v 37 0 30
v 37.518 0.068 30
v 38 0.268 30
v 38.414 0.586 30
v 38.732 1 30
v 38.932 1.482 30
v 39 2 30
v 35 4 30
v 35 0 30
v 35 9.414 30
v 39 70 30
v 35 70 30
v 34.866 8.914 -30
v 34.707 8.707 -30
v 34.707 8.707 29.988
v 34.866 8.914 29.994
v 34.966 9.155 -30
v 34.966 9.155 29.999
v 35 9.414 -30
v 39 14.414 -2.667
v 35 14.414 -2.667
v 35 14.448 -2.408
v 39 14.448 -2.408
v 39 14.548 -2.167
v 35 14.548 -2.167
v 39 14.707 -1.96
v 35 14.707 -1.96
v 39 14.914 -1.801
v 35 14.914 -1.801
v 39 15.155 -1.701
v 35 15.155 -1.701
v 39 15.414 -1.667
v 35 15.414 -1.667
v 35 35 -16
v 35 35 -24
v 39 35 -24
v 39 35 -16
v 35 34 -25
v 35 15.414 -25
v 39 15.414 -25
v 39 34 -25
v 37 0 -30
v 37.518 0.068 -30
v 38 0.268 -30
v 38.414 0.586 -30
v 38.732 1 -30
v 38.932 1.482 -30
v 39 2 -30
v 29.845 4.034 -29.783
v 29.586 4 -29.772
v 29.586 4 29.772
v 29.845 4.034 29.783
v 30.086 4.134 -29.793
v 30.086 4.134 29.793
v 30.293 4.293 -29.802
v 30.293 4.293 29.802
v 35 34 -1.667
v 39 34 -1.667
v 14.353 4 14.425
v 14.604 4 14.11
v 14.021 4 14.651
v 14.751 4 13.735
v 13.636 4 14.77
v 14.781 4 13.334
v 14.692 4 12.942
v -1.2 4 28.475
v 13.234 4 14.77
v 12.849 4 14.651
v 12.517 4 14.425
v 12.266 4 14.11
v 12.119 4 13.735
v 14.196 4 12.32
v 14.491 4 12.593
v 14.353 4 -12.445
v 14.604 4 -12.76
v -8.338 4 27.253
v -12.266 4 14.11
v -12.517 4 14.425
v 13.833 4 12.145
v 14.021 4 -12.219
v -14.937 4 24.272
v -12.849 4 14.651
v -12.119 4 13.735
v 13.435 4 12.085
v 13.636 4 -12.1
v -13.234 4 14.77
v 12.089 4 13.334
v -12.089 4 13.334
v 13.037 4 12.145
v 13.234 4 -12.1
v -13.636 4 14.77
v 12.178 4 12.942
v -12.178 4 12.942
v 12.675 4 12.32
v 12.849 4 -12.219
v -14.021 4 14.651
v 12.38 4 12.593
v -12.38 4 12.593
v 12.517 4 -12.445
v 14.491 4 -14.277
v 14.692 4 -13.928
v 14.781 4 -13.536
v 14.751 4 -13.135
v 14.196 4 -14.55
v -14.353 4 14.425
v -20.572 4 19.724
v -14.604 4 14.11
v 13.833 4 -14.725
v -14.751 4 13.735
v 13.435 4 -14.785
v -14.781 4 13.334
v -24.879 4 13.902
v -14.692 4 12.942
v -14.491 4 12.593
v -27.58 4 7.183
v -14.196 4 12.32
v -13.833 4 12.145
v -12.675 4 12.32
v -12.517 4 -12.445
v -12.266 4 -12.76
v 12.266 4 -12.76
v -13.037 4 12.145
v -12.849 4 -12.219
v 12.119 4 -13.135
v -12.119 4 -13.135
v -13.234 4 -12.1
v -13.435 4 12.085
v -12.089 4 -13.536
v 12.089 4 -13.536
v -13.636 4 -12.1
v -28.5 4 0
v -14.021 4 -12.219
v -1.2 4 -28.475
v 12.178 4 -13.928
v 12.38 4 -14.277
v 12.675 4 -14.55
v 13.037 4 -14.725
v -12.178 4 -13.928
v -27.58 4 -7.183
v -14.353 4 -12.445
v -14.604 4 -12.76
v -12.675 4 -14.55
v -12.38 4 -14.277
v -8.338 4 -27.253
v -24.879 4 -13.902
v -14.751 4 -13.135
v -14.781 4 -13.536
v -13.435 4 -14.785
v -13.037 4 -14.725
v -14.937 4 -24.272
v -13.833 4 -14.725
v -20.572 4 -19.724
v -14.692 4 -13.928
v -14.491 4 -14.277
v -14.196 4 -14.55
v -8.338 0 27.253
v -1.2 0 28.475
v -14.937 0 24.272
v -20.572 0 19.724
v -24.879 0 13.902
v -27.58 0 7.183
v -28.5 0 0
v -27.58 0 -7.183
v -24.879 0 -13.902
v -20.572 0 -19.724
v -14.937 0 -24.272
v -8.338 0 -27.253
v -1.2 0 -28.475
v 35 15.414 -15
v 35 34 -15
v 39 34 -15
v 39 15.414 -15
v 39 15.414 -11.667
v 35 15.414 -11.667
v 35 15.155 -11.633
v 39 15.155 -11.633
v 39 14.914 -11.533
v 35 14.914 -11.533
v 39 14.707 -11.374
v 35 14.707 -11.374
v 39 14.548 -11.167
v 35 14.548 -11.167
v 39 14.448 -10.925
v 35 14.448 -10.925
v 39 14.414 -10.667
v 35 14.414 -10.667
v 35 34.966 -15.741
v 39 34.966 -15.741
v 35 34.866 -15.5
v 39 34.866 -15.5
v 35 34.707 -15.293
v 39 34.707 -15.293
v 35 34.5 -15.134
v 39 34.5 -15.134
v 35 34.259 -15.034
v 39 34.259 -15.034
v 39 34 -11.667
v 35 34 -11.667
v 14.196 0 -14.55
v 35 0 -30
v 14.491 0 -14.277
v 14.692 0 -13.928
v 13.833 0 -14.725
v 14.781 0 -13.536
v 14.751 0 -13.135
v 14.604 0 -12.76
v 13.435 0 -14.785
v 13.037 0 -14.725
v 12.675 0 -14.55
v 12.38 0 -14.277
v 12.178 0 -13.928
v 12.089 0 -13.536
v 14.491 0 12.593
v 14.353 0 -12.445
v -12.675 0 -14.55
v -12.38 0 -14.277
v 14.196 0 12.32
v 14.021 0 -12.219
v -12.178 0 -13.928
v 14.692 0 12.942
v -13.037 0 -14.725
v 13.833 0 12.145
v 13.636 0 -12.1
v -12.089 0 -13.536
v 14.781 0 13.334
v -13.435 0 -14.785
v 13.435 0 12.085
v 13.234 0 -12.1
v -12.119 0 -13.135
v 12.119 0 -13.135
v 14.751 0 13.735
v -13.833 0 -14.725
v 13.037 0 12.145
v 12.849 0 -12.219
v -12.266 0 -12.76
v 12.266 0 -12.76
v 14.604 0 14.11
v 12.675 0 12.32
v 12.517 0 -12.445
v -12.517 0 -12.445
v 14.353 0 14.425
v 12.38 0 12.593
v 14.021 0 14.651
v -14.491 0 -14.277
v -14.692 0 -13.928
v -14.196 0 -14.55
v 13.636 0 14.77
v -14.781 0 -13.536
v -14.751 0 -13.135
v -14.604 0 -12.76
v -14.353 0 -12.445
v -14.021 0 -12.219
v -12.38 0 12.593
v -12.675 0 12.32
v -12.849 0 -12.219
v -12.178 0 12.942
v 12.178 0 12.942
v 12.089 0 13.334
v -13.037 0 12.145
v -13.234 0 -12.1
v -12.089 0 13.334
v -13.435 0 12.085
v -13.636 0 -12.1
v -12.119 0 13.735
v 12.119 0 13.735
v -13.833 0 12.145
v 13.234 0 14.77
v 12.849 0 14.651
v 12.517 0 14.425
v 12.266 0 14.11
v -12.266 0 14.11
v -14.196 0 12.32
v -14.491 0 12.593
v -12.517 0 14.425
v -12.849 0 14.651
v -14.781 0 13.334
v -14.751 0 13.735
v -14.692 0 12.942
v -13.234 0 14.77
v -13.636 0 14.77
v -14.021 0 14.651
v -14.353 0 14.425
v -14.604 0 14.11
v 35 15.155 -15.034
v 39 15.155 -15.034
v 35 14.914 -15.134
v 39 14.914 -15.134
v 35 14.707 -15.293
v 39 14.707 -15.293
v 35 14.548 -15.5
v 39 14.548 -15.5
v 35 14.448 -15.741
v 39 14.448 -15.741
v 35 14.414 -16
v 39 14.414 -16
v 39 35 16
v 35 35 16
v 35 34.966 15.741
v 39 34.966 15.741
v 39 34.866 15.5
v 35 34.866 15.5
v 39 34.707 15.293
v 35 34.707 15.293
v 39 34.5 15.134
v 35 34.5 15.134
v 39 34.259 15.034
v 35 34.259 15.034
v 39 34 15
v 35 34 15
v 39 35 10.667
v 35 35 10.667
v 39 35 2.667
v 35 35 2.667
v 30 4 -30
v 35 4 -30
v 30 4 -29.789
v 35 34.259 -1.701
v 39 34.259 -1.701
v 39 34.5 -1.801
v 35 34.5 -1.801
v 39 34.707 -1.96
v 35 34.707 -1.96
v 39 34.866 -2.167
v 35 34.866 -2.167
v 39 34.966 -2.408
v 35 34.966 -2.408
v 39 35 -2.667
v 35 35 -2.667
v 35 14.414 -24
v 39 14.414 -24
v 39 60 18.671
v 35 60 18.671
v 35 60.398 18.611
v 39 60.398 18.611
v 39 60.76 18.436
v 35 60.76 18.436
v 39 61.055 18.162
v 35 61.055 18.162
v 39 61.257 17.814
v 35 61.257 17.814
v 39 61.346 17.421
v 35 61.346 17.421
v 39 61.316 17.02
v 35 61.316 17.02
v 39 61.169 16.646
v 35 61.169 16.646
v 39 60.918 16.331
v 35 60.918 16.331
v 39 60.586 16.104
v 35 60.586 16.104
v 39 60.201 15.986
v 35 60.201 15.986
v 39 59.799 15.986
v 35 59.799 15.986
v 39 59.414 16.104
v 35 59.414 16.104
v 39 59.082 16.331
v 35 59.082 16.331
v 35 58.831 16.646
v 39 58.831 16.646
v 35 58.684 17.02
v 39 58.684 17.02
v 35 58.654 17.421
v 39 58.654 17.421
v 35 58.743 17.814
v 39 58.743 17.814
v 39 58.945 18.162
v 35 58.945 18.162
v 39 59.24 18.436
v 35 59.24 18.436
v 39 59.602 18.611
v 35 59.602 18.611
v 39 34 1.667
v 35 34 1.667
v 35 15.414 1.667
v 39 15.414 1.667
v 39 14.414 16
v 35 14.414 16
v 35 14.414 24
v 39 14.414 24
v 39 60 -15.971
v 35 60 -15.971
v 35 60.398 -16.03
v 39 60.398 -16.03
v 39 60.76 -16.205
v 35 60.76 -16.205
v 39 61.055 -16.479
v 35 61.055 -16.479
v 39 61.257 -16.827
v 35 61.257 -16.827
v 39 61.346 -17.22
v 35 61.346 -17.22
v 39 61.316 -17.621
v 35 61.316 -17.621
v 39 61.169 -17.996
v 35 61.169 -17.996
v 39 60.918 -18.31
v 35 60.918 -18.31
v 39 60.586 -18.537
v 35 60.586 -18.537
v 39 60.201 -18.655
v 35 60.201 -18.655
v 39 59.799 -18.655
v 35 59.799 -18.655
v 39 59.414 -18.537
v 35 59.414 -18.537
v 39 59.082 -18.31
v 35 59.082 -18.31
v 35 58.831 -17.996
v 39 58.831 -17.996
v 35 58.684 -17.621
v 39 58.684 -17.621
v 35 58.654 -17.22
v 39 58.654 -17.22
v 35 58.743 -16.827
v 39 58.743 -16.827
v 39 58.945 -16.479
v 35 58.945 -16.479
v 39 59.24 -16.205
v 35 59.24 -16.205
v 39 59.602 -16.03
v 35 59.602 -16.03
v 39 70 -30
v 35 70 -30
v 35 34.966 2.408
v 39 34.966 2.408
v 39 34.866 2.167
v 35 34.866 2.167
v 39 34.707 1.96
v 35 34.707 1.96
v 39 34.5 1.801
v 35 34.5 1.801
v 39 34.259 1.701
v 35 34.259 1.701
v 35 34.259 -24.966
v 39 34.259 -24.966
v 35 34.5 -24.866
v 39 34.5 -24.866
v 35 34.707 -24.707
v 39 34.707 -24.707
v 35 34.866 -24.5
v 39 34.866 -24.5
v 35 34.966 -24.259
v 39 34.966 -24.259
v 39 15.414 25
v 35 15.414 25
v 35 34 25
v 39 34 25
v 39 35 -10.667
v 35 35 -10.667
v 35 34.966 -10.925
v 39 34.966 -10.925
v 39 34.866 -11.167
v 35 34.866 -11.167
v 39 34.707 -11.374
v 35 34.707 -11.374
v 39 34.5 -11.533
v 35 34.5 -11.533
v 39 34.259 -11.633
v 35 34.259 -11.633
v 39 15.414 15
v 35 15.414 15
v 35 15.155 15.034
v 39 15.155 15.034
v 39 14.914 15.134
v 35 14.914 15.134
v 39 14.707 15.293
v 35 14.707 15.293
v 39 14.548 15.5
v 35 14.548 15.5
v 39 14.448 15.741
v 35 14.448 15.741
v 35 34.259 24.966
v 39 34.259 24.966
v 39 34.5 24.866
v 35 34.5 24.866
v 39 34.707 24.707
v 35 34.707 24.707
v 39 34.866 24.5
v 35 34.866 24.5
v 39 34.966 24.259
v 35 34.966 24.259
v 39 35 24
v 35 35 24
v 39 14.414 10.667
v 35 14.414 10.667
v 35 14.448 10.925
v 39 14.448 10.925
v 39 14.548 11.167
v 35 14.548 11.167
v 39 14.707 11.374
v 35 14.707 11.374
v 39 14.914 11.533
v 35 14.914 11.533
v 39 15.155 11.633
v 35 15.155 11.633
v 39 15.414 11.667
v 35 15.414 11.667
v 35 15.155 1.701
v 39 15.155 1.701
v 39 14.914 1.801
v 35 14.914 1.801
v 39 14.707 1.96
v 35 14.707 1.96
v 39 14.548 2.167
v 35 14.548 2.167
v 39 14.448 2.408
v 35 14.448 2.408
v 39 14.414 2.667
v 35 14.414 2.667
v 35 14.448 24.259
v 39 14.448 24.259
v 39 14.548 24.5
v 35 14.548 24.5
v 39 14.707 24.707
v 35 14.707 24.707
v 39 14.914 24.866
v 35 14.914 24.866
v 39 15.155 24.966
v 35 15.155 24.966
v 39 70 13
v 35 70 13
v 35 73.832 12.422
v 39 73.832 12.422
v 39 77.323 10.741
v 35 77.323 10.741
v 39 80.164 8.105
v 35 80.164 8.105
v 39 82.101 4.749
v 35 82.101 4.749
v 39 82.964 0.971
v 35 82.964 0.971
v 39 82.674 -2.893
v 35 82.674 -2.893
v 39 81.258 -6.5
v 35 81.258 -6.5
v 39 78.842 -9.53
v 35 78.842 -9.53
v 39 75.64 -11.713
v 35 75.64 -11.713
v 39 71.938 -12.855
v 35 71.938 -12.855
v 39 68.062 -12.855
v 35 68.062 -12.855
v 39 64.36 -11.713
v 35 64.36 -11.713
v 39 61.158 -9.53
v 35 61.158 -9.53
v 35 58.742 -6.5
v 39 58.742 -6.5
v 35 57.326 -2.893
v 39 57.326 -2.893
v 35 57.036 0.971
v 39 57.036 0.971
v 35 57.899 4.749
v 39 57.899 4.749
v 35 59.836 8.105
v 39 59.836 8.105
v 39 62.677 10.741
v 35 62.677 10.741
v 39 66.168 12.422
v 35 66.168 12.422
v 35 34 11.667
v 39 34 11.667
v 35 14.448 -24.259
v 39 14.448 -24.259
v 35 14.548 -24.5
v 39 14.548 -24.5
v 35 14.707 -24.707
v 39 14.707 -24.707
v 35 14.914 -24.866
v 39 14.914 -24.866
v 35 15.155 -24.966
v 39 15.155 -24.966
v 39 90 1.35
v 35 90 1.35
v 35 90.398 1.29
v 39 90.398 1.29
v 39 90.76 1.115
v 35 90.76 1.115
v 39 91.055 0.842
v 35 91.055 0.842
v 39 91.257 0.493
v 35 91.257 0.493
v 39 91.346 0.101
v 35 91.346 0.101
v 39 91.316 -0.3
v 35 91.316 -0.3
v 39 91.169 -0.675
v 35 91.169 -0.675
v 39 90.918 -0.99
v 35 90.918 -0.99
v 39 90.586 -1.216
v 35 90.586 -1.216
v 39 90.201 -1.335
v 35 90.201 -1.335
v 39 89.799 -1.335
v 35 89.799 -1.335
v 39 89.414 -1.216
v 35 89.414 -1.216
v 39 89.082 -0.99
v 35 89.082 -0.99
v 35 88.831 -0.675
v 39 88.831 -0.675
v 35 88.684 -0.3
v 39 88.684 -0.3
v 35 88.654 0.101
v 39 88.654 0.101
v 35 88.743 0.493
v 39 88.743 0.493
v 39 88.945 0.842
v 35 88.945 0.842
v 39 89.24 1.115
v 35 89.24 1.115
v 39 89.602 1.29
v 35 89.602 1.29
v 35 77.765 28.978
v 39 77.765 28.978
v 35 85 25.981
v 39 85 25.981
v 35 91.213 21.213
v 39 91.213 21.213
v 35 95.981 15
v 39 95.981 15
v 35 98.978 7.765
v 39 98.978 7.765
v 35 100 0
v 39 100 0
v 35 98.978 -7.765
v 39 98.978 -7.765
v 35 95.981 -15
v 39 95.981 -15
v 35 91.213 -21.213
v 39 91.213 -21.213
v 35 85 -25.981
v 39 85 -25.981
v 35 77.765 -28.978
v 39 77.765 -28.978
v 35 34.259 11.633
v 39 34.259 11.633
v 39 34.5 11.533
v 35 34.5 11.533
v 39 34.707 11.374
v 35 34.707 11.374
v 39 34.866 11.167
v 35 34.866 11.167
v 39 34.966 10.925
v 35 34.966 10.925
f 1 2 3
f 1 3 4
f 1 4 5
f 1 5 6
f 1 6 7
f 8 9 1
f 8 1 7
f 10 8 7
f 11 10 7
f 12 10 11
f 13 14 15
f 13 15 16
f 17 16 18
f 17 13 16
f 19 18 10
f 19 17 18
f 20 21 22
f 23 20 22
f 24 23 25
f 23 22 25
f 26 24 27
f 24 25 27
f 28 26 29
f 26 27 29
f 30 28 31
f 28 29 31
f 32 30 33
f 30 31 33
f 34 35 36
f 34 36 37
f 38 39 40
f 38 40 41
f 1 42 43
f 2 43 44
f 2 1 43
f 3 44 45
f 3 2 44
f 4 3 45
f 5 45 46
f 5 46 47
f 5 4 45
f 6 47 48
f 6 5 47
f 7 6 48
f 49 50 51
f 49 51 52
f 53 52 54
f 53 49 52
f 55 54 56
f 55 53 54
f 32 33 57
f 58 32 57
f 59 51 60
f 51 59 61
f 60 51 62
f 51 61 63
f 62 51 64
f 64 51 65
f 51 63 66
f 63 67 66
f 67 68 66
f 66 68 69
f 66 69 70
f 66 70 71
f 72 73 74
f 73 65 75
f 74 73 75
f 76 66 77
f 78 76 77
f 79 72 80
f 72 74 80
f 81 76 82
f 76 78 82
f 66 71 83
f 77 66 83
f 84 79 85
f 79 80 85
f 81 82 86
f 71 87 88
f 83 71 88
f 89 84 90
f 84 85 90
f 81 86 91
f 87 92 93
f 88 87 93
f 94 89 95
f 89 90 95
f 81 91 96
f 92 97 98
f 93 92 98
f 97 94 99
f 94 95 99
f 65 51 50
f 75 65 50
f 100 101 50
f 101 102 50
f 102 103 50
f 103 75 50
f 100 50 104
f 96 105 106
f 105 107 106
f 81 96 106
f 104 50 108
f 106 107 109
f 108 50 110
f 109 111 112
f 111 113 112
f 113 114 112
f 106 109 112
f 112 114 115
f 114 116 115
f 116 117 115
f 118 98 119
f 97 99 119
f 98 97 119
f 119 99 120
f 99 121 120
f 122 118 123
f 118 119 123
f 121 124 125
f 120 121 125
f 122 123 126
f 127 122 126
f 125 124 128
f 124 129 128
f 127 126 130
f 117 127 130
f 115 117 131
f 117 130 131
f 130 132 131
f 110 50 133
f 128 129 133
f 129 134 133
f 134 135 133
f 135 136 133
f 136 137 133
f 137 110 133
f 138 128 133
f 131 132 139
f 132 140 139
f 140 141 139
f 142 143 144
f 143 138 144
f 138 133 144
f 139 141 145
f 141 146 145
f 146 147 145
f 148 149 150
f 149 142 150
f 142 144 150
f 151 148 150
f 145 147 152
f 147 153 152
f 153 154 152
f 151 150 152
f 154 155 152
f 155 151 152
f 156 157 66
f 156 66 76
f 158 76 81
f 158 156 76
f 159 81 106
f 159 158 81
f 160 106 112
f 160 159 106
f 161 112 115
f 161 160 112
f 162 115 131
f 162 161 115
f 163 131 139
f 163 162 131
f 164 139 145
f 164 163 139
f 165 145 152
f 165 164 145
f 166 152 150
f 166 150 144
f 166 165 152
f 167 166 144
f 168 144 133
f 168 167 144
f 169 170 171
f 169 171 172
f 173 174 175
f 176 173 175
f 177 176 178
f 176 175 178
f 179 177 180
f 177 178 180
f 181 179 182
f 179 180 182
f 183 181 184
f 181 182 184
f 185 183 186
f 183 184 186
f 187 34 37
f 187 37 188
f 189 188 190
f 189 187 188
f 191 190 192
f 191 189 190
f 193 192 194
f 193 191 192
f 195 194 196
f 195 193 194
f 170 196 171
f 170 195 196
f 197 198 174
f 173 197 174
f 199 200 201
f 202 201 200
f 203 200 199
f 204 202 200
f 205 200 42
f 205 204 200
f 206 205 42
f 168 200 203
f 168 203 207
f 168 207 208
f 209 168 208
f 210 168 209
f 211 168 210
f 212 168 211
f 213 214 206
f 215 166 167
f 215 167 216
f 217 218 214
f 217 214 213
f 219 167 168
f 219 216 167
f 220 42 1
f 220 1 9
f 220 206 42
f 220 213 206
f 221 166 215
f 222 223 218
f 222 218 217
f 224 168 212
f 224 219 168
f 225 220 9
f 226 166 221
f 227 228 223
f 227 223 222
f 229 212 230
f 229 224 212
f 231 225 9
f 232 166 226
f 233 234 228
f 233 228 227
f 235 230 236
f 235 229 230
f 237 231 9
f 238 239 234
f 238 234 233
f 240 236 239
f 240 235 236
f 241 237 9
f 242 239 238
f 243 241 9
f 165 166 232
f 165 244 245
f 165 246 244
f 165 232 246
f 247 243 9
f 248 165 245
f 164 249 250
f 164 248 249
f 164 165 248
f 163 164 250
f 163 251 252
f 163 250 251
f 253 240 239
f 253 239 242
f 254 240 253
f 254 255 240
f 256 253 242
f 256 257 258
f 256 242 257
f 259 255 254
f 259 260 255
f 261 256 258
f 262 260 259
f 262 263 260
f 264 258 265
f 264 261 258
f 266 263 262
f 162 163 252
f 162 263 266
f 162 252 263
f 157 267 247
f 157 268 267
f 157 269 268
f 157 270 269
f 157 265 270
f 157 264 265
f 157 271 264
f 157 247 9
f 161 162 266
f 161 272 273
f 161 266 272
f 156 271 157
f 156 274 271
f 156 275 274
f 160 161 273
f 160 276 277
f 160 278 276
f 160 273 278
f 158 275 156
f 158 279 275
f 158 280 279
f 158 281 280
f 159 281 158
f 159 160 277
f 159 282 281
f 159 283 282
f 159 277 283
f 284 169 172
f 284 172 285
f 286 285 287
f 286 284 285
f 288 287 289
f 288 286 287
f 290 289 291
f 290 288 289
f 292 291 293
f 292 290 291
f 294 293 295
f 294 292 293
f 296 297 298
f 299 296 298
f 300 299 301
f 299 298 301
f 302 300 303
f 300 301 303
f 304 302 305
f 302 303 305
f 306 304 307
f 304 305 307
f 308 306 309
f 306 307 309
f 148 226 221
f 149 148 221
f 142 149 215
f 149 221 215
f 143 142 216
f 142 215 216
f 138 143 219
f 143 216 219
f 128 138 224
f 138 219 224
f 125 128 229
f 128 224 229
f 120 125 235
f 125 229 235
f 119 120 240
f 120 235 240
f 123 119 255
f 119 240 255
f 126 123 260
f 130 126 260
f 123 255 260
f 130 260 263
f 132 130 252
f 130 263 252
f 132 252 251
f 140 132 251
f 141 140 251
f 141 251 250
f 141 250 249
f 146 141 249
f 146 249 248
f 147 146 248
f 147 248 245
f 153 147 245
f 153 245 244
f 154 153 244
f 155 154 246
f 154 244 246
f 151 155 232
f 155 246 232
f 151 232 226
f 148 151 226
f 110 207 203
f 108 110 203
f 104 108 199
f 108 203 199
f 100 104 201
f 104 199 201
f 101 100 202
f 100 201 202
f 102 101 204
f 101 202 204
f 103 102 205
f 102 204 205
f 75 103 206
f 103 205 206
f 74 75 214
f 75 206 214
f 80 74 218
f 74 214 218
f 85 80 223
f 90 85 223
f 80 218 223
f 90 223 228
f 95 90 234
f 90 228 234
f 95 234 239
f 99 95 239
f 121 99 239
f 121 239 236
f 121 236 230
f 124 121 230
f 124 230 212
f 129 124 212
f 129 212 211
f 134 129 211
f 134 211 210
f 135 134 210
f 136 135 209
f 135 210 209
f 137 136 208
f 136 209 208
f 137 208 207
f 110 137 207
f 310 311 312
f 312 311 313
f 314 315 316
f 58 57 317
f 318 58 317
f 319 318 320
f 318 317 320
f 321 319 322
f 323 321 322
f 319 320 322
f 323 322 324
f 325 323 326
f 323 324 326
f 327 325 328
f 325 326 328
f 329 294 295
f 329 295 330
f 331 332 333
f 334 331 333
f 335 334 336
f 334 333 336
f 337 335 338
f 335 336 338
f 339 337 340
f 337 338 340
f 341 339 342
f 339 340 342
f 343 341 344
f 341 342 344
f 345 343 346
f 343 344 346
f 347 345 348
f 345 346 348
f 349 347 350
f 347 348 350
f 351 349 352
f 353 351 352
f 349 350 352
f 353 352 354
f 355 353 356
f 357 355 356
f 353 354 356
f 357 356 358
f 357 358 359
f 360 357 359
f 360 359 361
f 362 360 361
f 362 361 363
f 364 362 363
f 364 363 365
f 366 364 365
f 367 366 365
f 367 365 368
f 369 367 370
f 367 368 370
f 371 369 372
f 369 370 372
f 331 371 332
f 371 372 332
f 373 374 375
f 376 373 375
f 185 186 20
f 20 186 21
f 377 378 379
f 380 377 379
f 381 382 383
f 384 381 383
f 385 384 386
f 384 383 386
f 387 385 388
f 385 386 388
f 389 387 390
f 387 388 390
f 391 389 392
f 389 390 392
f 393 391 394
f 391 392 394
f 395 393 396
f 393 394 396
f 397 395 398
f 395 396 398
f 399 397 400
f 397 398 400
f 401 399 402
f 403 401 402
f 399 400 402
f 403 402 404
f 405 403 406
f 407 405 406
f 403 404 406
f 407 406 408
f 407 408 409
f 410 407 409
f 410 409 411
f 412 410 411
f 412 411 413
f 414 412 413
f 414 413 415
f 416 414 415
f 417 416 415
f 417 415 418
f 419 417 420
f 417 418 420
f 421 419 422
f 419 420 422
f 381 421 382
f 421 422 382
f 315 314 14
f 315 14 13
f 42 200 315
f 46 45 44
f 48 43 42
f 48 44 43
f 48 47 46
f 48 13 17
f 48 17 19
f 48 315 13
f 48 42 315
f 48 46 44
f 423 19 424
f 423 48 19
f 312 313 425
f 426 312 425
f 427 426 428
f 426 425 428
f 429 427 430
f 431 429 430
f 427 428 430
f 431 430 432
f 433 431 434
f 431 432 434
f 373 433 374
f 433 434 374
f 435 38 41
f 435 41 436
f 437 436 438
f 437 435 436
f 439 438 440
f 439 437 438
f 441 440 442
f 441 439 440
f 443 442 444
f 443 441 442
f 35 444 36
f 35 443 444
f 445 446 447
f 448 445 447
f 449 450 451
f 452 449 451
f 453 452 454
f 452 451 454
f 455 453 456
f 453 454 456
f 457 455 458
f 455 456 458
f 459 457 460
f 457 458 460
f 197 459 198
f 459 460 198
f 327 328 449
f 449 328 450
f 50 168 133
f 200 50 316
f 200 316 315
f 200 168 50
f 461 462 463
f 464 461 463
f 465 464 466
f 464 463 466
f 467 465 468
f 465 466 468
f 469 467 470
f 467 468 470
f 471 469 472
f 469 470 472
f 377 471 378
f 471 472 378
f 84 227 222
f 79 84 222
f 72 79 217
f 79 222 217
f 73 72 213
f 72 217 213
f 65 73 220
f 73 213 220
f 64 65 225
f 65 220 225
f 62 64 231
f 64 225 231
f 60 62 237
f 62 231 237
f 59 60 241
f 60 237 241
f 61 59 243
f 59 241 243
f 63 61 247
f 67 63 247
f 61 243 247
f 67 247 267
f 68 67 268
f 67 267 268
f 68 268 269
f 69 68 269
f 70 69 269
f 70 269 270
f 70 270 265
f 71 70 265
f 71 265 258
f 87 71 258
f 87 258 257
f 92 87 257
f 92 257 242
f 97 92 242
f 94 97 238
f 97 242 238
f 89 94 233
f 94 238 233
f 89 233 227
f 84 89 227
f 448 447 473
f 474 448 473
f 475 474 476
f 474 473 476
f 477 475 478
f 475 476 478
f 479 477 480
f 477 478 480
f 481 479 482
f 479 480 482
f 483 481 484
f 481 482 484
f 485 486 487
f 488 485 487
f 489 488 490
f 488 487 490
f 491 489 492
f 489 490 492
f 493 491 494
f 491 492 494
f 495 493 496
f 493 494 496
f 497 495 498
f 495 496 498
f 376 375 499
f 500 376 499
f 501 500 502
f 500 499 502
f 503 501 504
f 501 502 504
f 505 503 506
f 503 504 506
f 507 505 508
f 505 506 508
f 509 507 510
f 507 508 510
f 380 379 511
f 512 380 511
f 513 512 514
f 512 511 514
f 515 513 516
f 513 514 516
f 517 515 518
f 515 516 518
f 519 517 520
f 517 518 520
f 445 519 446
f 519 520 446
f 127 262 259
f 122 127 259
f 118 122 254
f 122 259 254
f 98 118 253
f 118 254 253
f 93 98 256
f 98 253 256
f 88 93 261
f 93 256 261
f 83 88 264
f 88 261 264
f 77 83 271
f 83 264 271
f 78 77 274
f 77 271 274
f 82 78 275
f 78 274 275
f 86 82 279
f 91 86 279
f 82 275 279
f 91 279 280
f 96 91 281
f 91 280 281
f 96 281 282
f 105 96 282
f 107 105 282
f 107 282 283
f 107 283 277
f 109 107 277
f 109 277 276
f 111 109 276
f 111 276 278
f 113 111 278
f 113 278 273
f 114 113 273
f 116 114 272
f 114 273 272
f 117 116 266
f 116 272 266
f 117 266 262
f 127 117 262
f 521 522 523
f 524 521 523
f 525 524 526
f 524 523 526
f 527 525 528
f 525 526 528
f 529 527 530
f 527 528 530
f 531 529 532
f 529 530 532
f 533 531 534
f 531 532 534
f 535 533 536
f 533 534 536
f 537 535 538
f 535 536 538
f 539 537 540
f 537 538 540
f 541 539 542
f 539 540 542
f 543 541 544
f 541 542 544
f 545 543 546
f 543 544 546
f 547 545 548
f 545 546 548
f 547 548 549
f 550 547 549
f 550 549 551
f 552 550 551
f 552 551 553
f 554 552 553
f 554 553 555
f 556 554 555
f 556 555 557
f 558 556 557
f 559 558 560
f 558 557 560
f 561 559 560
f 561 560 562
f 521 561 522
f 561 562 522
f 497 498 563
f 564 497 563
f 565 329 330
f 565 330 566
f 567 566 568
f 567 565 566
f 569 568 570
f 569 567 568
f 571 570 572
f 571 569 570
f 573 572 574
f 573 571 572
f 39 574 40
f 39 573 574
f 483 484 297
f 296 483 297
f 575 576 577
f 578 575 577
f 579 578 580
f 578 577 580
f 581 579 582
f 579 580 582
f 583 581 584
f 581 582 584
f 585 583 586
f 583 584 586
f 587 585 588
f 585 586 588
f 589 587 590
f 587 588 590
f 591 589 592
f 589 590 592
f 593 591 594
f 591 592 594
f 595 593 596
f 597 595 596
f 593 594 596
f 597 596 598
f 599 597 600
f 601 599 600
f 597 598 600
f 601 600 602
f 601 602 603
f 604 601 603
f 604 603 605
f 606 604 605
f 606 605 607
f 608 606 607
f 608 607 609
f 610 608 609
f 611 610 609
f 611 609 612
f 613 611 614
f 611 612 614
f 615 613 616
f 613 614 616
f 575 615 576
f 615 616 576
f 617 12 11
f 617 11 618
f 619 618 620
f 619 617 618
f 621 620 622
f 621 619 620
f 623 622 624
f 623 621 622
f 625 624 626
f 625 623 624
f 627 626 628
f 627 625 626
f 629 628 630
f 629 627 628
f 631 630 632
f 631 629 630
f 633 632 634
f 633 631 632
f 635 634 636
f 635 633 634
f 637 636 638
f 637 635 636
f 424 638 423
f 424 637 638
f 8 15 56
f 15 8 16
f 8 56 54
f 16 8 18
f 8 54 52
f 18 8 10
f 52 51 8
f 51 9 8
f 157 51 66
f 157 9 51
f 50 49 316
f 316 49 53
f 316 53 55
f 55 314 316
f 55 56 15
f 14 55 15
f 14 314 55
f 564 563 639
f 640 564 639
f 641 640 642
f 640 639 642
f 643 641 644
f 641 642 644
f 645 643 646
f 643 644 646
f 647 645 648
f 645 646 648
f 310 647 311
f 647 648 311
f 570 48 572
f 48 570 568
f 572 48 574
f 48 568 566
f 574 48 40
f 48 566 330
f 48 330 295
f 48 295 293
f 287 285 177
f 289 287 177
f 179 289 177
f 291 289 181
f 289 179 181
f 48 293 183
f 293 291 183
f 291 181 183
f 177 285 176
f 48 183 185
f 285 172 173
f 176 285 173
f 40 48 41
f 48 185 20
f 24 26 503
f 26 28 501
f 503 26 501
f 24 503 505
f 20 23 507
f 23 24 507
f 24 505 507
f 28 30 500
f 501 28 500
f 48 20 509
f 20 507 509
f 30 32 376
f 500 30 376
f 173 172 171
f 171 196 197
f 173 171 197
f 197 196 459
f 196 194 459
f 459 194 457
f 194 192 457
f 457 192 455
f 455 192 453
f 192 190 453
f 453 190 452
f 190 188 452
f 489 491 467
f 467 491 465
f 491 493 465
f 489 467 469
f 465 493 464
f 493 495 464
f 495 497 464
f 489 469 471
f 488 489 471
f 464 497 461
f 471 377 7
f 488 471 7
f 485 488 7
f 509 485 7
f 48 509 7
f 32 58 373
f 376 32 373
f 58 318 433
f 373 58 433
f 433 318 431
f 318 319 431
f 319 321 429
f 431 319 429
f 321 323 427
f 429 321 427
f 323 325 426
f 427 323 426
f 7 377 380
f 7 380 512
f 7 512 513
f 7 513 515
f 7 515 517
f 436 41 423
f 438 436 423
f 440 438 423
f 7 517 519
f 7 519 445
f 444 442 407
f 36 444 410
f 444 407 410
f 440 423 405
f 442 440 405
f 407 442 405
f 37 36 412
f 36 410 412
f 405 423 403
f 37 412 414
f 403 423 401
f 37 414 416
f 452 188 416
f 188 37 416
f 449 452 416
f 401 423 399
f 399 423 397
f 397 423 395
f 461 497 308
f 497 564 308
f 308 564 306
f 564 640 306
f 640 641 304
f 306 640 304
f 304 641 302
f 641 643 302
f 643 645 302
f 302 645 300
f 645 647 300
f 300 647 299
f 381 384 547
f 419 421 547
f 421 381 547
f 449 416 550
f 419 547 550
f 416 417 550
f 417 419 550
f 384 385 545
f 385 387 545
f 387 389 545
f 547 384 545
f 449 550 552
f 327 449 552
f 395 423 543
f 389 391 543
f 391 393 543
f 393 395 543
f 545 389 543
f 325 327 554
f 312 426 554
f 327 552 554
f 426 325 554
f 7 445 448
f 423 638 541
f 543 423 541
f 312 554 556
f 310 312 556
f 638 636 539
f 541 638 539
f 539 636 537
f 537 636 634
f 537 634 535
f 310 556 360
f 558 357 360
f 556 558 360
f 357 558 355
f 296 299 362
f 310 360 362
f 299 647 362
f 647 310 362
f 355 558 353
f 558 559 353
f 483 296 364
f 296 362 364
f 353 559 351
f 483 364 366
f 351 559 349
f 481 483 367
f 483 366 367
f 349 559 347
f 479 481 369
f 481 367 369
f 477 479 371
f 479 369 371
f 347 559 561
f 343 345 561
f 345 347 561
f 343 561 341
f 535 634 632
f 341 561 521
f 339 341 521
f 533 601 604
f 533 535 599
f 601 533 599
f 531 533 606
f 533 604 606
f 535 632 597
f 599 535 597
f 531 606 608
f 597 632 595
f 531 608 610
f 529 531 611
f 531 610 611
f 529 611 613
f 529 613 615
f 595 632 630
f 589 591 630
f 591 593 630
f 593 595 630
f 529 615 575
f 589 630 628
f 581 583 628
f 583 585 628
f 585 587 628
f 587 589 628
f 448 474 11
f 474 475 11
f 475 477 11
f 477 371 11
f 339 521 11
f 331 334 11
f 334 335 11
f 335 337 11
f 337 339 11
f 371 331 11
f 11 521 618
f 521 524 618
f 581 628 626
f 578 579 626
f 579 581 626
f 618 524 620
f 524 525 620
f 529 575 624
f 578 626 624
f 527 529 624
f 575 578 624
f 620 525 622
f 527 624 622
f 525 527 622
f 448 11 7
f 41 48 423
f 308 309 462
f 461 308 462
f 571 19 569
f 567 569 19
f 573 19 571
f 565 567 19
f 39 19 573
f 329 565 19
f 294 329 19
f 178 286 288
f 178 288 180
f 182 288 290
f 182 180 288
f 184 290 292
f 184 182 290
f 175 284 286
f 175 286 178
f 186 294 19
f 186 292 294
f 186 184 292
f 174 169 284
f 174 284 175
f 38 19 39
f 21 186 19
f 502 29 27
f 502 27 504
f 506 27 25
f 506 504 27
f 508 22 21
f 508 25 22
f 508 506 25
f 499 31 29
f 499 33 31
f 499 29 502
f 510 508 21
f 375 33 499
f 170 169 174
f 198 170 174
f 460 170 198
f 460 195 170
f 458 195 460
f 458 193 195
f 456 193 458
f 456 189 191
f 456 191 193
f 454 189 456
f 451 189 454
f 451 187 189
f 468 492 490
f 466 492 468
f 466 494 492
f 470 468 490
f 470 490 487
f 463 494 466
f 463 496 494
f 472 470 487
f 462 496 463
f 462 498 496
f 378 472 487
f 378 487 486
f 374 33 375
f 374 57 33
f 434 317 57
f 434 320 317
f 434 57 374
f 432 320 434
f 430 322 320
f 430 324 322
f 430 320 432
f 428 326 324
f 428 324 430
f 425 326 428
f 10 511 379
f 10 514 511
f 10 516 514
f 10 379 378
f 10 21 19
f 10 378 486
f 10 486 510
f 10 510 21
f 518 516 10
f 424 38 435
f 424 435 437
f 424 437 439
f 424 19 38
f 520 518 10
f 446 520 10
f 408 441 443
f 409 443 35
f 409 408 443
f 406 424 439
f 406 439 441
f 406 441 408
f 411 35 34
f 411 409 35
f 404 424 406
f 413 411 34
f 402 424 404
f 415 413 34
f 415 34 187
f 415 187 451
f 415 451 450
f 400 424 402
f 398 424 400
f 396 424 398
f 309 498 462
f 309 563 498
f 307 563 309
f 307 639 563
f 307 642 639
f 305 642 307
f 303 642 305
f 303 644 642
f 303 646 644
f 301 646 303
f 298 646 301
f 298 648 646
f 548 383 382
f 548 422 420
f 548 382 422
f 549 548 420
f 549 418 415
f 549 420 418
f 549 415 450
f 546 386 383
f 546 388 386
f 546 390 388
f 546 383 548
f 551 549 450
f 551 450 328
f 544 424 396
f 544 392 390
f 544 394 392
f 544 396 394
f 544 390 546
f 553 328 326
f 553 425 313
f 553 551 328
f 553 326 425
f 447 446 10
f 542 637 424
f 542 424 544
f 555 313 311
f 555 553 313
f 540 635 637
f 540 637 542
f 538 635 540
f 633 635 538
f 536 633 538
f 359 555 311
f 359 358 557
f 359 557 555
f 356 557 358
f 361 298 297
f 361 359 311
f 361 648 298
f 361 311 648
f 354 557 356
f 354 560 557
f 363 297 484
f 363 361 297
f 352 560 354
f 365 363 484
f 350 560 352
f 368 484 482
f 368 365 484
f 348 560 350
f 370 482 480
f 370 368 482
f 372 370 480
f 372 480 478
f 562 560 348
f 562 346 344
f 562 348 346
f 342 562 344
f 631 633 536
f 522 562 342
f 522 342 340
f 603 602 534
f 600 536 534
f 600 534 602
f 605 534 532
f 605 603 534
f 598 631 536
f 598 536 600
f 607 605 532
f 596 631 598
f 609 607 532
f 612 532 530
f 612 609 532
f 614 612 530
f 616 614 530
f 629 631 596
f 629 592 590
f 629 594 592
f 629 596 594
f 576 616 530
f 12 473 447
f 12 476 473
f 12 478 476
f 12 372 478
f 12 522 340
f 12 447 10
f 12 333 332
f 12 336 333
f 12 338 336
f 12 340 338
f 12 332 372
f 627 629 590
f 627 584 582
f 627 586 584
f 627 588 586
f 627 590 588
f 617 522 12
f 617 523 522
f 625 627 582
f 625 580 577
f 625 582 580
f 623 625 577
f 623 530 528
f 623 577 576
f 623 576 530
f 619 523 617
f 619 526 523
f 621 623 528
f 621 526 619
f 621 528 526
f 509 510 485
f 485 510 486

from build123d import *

# Parameters (mm, degrees)
EXTRUDE_1_DEPTH     = 4
EXTRUDE_2_DEPTH     = 4
SKETCH_4_R          = 1.35
SKETCH_4_R_2        = 13
CUT_EXTRUDE_1_DEPTH = 4
SKETCH_5_R          = 1.35
CUT_EXTRUDE_2_DEPTH = 4
EXTRUDE_3_REACH     = 124.967
FILLET_1_R          = 1
CUT_EXTRUDE_3_DEPTH = 4
FILLET_2_R          = 2


with BuildPart() as part:
    # 草图1 → 凸台-拉伸1 (new body)
    with BuildSketch(Plane(origin=(0, 0, 0), x_dir=(1, 0, 0), z_dir=(0, 1, 0))):
        with BuildLine():
            Line((-1.199773028, 28.474735199), (35, 30))
            Line((35, 30), (35, -30))
            Line((35, -30), (-1.199773028, -28.474735199))
            ThreePointArc((-1.199773028, -28.474735199), (-28.5, 0), (-1.199773028, 28.474735199))
        make_face()
    extrude(amount=EXTRUDE_1_DEPTH)

    # 草图3 → 凸台-拉伸2 (add)
    with BuildSketch(Plane(origin=(35, 0, 0), x_dir=(0, 0, -1), z_dir=(1, 0, 0))):
        with BuildLine():
            Line((-30, 0), (-30, 70))
            ThreePointArc((-30, 70), (0, 100), (30, 70))
            Line((30, 70), (30, 0))
            Line((30, 0), (-30, 0))
        make_face()
    extrude(amount=EXTRUDE_2_DEPTH)

    # 草图4 → 切除-拉伸1 (cut)
    with BuildSketch(Plane.ZY.offset(-35)):
        with Locations((0, 90)):
            Circle(SKETCH_4_R)
        with Locations((17.320508076, 60)):
            Circle(SKETCH_4_R)
        with Locations((-17.320508076, 60)):
            Circle(SKETCH_4_R)
        with Locations((0, 70)):
            Circle(SKETCH_4_R_2)
    extrude(amount=-CUT_EXTRUDE_1_DEPTH, mode=Mode.SUBTRACT)

    # 草图5 → 切除-拉伸2 (cut)
    with BuildSketch(Plane.XZ):
        with Locations(Location((-13.435028843, 13.435028843, 0), (0, 0, 270))):
            Circle(SKETCH_5_R)
        with Locations(Location((13.435028843, 13.435028843, 0), (0, 0, 270))):
            Circle(SKETCH_5_R)
        with Locations(Location((13.435028843, -13.435028843, 0), (0, 0, 270))):
            Circle(SKETCH_5_R)
        with Locations(Location((-13.435028843, -13.435028843, 0), (0, 0, 270))):
            Circle(SKETCH_5_R)
    extrude(amount=-CUT_EXTRUDE_2_DEPTH, mode=Mode.SUBTRACT)

    # 凸台-拉伸3: up to this plane
    extrude_3_end = Plane(origin=(35, 4, 30), z_dir=(0.04209729923272397, 0, -0.9991135157715116))
    # 草图6 → 凸台-拉伸3 (add, up to the surface)
    with BuildSketch(Plane(origin=(0, 0, -30), x_dir=(-1, 0, 0), z_dir=(0, 0, -1)), mode=Mode.PRIVATE) as extrude_3_sk1:
        Polygon((-35, 9), (-35, 4), (-30, 4), align=None)
    extrude_3_tool1 = split(extrude(extrude_3_sk1.sketch, amount=-EXTRUDE_3_REACH, mode=Mode.PRIVATE), bisect_by=extrude_3_end, keep=Keep.BOTH, mode=Mode.PRIVATE)
    add(extrude_3_tool1.solids().sort_by_distance((33.333333, 5.666667, -30))[0])

    # 圆角1
    # the kernel refuses this fillet: 1 mm, written as the material it adds along each edge
    with BuildSketch(Plane(origin=(35, 9, -30), x_dir=(-0.7071067811865455, -0.7071067811865497, 0), z_dir=(0, 0, 1))) as fillet_1_piece_1_section:
        with BuildLine():
            CenterArc((FILLET_1_R * 0.414213562373, -FILLET_1_R), FILLET_1_R, 90, 45)
            Line((-FILLET_1_R * 0.292893218813, -FILLET_1_R * 0.292893218813), (0, 0))
            Line((0, 0), (FILLET_1_R * 0.414213562373, 0))
        make_face()
    fillet_1_piece_1 = extrude(amount=61.035533906, mode=Mode.PRIVATE)
    fillet_1_piece_1 = split(fillet_1_piece_1, bisect_by=Plane(origin=(33.678090618, 9.024924819, 29.94430181), z_dir=(0.042097299232723984, 0, -0.9991135157715116)), keep=Keep.TOP, mode=Mode.PRIVATE)
    add(fillet_1_piece_1)
    with BuildSketch(Plane(origin=(30, 4, -30.824860651), x_dir=(0.7071067811865442, 0.7071067811865507, 0), z_dir=(0, 0, 1))) as fillet_1_piece_2_section:
        with BuildLine():
            CenterArc((FILLET_1_R * 0.414213562373, FILLET_1_R), FILLET_1_R, 225, 45)
            Line((-FILLET_1_R * 0.292893218813, FILLET_1_R * 0.292893218813), (0, 0))
            Line((0, 0), (FILLET_1_R * 0.414213562373, 0))
        make_face()
    fillet_1_piece_2 = extrude(amount=61.649721303, mode=Mode.PRIVATE)
    fillet_1_piece_2 = split(fillet_1_piece_2, bisect_by=Plane(origin=(28.722202674, 4.060172408, -29.735487201), z_dir=(0.042097299232723984, 0, 0.9991135157715116)), keep=Keep.TOP, mode=Mode.PRIVATE)
    fillet_1_piece_2 = split(fillet_1_piece_2, bisect_by=Plane(origin=(28.722202674, 4.060172408, 29.735487201), z_dir=(0.042097299232723984, 0, -0.9991135157715116)), keep=Keep.TOP, mode=Mode.PRIVATE)
    add(fillet_1_piece_2)

    # 草图7 → 切除-拉伸3 (cut)
    with BuildSketch(Plane.ZY.offset(-35)):
        with BuildLine():
            Line((-24, 35), (-16, 35))
            ThreePointArc((-16, 35), (-15.292893219, 34.707106781), (-15, 34))
            Line((-15, 34), (-15, 15.414213562))
            ThreePointArc((-15, 15.414213562), (-15.292893219, 14.707106781), (-16, 14.414213562))
            Line((-16, 14.414213562), (-24, 14.414213562))
            ThreePointArc((-24, 14.414213562), (-24.707106781, 14.707106781), (-25, 15.414213562))
            Line((-25, 15.414213562), (-25, 34))
            ThreePointArc((-25, 34), (-24.707106781, 34.707106781), (-24, 35))
        make_face()
        with BuildLine():
            Line((-11.666666667, 34), (-11.666666667, 15.414213562))
            ThreePointArc((-11.666666667, 15.414213562), (-11.373773448, 14.707106781), (-10.666666667, 14.414213562))
            Line((-10.666666667, 14.414213562), (-2.666666667, 14.414213562))
            ThreePointArc((-2.666666667, 14.414213562), (-1.959559885, 14.707106781), (-1.666666667, 15.414213562))
            Line((-1.666666667, 15.414213562), (-1.666666667, 34))
            ThreePointArc((-1.666666667, 34), (-1.959559885, 34.707106781), (-2.666666667, 35))
            Line((-2.666666667, 35), (-10.666666667, 35))
            ThreePointArc((-10.666666667, 35), (-11.373773448, 34.707106781), (-11.666666667, 34))
        make_face()
        with BuildLine():
            Line((1.666666667, 34), (1.666666667, 15.414213562))
            ThreePointArc((1.666666667, 15.414213562), (1.959559885, 14.707106781), (2.666666667, 14.414213562))
            Line((2.666666667, 14.414213562), (10.666666667, 14.414213562))
            ThreePointArc((10.666666667, 14.414213562), (11.373773448, 14.707106781), (11.666666667, 15.414213562))
            Line((11.666666667, 15.414213562), (11.666666667, 34))
            ThreePointArc((11.666666667, 34), (11.373773448, 34.707106781), (10.666666667, 35))
            Line((10.666666667, 35), (2.666666667, 35))
            ThreePointArc((2.666666667, 35), (1.959559885, 34.707106781), (1.666666667, 34))
        make_face()
        with BuildLine():
            Line((15, 34), (15, 15.414213562))
            ThreePointArc((15, 15.414213562), (15.292893219, 14.707106781), (16, 14.414213562))
            Line((16, 14.414213562), (24, 14.414213562))
            ThreePointArc((24, 14.414213562), (24.707106781, 14.707106781), (25, 15.414213562))
            Line((25, 15.414213562), (25, 34))
            ThreePointArc((25, 34), (24.707106781, 34.707106781), (24, 35))
            Line((24, 35), (16, 35))
            ThreePointArc((16, 35), (15.292893219, 34.707106781), (15, 34))
        make_face()
    extrude(amount=-CUT_EXTRUDE_3_DEPTH, mode=Mode.SUBTRACT)

    # 圆角2
    fillet_2_edges = [part.edges().sort_by_distance(p)[0] for p in [
        (39, 0, 0),
    ]]
    fillet(fillet_2_edges, radius=FILLET_2_R)


solid = part.part
